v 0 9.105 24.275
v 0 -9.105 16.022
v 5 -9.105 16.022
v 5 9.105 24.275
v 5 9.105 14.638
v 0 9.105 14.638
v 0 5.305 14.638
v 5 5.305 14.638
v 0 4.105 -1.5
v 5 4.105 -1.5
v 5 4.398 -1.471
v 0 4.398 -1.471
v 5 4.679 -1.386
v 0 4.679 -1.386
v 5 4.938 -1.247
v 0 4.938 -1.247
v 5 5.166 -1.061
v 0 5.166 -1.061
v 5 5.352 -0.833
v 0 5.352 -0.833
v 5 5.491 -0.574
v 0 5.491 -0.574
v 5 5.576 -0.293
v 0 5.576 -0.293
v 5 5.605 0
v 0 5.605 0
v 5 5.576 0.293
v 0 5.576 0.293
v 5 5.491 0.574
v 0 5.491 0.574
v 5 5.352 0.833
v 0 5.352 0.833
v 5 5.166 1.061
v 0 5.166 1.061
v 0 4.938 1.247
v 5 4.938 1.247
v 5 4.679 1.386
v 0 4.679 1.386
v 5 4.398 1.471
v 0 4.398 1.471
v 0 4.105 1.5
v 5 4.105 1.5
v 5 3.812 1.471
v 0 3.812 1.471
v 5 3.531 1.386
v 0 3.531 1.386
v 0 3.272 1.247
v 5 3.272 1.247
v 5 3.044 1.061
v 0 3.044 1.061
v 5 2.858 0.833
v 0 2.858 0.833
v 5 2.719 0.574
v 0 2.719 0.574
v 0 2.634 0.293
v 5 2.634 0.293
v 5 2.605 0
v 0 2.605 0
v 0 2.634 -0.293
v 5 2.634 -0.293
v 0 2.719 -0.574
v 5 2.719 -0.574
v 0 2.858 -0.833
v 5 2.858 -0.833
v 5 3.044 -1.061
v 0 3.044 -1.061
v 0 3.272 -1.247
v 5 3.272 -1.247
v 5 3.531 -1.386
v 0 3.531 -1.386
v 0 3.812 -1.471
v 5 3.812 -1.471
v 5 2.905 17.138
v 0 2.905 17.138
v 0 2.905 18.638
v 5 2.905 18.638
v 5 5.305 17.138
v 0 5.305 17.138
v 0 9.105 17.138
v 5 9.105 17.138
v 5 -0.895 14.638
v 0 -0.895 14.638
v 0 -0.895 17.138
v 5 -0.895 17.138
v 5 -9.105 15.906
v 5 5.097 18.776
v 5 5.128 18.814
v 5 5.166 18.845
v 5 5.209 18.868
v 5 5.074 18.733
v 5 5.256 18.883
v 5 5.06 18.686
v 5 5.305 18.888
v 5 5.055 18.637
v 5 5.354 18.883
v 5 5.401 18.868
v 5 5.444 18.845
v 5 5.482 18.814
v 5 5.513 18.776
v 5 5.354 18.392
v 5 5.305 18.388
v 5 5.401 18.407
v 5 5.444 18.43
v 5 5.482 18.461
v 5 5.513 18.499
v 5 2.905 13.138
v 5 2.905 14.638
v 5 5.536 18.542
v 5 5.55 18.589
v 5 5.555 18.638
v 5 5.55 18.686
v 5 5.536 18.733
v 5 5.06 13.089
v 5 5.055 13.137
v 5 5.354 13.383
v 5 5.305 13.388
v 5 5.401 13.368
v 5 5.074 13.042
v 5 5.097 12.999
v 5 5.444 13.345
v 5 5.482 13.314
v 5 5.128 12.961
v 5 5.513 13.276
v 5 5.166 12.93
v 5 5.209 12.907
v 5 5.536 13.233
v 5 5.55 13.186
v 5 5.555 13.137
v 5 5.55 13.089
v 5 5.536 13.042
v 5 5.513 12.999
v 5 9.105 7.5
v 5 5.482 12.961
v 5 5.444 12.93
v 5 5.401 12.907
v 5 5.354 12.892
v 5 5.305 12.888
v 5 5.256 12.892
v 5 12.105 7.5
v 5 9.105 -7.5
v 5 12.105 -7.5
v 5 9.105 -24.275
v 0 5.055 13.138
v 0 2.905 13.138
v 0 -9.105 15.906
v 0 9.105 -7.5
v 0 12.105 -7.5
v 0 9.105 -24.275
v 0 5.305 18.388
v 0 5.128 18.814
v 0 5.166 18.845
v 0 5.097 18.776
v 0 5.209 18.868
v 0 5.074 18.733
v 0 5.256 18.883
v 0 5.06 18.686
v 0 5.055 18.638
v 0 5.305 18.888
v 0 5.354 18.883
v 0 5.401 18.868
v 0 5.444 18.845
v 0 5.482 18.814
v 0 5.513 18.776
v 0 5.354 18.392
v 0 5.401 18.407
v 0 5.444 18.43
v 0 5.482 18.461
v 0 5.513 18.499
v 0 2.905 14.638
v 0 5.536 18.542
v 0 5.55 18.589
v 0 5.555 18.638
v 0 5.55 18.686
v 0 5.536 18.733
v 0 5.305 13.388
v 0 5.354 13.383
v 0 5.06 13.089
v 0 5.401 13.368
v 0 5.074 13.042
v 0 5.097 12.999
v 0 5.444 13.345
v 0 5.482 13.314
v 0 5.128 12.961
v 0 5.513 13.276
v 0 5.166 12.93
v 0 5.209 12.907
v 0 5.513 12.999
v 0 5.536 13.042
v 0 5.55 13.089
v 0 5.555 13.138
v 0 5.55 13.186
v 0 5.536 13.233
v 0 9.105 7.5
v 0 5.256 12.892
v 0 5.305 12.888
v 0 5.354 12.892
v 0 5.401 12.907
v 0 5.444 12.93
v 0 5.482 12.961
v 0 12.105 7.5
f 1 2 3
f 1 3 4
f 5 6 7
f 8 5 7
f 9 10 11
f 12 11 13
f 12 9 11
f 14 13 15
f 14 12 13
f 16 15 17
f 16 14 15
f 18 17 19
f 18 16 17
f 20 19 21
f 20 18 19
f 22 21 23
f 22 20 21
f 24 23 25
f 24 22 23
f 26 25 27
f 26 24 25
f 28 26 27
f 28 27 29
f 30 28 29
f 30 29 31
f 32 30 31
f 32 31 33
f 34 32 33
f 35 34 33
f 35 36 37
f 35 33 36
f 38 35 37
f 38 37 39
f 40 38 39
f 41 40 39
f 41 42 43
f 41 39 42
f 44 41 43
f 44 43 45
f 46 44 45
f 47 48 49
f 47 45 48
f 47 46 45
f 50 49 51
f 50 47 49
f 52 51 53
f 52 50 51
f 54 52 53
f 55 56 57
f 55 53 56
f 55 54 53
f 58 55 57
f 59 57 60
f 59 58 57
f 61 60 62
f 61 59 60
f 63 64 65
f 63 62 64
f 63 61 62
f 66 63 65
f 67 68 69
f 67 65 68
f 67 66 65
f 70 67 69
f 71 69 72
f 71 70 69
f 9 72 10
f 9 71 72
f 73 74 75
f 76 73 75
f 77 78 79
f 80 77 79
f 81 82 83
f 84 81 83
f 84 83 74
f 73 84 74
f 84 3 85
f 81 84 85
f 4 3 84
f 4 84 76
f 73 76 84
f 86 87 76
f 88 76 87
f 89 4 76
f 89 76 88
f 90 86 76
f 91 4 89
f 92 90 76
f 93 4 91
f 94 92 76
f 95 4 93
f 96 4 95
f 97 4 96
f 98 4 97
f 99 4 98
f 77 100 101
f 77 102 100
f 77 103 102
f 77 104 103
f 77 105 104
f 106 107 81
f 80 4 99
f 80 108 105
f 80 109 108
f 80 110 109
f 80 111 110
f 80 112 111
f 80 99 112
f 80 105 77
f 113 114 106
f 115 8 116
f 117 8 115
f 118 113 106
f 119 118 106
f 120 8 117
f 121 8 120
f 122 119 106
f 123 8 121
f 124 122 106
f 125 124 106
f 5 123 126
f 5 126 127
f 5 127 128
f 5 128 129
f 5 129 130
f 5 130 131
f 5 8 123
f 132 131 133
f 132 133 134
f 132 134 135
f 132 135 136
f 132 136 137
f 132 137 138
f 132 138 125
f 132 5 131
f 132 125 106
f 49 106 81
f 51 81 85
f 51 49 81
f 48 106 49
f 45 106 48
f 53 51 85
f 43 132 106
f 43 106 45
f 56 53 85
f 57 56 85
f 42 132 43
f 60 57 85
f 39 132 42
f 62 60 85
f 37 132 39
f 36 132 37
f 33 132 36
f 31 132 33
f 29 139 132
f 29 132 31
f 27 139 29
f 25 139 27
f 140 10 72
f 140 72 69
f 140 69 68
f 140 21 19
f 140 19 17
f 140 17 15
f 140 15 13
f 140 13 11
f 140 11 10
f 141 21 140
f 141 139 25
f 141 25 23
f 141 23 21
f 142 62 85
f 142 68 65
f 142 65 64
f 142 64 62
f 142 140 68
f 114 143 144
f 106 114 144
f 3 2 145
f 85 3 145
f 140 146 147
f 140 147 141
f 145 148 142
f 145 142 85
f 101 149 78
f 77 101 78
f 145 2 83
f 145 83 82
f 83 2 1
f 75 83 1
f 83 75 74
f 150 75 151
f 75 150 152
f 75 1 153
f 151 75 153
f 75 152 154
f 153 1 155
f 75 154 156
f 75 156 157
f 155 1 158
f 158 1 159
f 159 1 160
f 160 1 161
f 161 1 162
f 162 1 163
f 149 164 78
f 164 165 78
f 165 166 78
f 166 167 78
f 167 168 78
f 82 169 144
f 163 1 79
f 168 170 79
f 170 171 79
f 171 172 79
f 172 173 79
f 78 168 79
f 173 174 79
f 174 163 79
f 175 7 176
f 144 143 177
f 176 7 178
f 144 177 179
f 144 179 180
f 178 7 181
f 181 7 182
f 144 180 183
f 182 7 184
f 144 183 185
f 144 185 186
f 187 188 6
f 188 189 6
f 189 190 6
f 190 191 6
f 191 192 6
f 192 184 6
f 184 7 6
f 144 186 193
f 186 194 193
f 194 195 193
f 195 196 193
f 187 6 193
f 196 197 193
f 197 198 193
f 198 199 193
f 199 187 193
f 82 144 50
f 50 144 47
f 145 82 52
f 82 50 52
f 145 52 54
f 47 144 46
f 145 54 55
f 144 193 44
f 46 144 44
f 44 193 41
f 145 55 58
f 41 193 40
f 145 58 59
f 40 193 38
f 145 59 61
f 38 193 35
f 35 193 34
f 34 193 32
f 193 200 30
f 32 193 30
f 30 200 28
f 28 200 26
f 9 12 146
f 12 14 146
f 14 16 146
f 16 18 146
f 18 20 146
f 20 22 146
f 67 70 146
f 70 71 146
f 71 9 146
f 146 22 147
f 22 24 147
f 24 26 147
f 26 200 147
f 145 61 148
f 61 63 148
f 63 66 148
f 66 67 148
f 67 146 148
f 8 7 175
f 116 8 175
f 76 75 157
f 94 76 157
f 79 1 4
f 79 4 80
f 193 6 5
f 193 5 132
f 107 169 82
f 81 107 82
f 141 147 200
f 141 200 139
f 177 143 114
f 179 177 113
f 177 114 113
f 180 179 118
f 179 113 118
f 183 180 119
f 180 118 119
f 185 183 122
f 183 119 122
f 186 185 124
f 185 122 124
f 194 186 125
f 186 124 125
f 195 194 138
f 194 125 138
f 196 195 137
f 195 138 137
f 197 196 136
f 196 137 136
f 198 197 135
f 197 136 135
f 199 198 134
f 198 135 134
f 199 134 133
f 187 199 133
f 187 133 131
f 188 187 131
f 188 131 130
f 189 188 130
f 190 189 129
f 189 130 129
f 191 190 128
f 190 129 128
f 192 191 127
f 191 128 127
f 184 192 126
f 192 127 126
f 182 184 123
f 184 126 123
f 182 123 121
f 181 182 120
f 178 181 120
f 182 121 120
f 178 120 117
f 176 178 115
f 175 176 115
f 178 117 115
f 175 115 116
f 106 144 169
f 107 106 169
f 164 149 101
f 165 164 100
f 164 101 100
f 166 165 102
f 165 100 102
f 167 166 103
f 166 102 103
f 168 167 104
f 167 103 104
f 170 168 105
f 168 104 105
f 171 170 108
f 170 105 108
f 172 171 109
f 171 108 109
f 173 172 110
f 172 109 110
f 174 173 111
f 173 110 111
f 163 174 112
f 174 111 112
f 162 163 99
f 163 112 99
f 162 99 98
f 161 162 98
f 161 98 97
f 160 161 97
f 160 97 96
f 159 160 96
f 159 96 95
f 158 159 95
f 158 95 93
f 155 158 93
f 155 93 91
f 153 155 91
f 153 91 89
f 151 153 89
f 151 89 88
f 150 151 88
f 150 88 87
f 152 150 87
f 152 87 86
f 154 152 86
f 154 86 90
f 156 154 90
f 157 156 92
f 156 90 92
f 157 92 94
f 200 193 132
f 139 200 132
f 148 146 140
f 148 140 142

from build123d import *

# Parameters (mm, degrees)
SCHIZZO1_W                   = 48.55
SCHIZZO1_H                   = 18.21
ESTRUSIONE_ESTRUSIONE1_DEPTH = 5
TAGLIO_ESTRUSIONE1_DEPTH     = 6
SCHIZZO3_R                   = 1.5
TAGLIO_ESTRUSIONE2_DEPTH     = 6
SCHIZZO4_W                   = 5
SCHIZZO4_H                   = 15
ESTRUSIONE_ESTRUSIONE2_DEPTH = 3
TAGLIO_ESTRUSIONE3_DEPTH     = 6
SCHIZZO7_R                   = 0.25
TAGLIO_ESTRUSIONE4_DEPTH     = 6


with BuildPart() as part:
    # Schizzo1 → Estrusione-Estrusione1 (new body)
    with BuildSketch(Plane(origin=(0, 0, 0), x_dir=(0, 0, -1), z_dir=(1, 0, 0))):
        Rectangle(SCHIZZO1_W, SCHIZZO1_H)
    extrude(amount=ESTRUSIONE_ESTRUSIONE1_DEPTH)

    # Schizzo2 → Taglio-Estrusione1 (cut, through all)
    with BuildSketch(Plane(origin=(0, 0, 0), x_dir=(0, 0, -1), z_dir=(1, 0, 0))):
        Polygon((24.275, 9.105), (-15.905998409, -9.105), (24.275, -9.105), align=None)
        Polygon((-24.275, 9.105), (-24.275, -9.105), (-16.019269678, -9.111556119), align=None)
    extrude(amount=TAGLIO_ESTRUSIONE1_DEPTH, mode=Mode.SUBTRACT)

    # Schizzo3 → Taglio-Estrusione2 (cut, through all)
    with BuildSketch(Plane(origin=(0, 0, 0), x_dir=(0, 0, -1), z_dir=(1, 0, 0))):
        with Locations((0, 4.105)):
            Circle(SCHIZZO3_R)
    extrude(amount=TAGLIO_ESTRUSIONE2_DEPTH, mode=Mode.SUBTRACT)

    # Schizzo4 → Estrusione-Estrusione2 (add)
    with BuildSketch(Plane(origin=(0, 9.105, 0), x_dir=(1, 0, 0), z_dir=(0, 1, 0))):
        with Locations((2.5, 0)):
            Rectangle(SCHIZZO4_W, SCHIZZO4_H)
    extrude(amount=ESTRUSIONE_ESTRUSIONE2_DEPTH)

    # Schizzo6 → Taglio-Estrusione3 (cut, through all)
    with BuildSketch(Plane(origin=(0, 0, 0), x_dir=(0, 0, -1), z_dir=(1, 0, 0))):
        Polygon((-17.1375, -0.895), (-17.1375, 2.905), (-18.6375, 2.905), (-18.6375, 5.305), (-17.1375, 5.305), (-17.1375, 9.105), (-14.6375, 9.105), (-14.6375, 5.305), (-13.1375, 5.305), (-13.1375, 2.905), (-14.6375, 2.905), (-14.6375, -0.895), align=None)
    extrude(amount=TAGLIO_ESTRUSIONE3_DEPTH, mode=Mode.SUBTRACT)

    # Schizzo7 → Taglio-Estrusione4 (cut, through all)
    with BuildSketch(Plane(origin=(5, 0, 0), x_dir=(0, 0, -1), z_dir=(1, 0, 0))):
        with Locations((-18.6375, 5.305)):
            Circle(SCHIZZO7_R)
        with Locations((-13.1375, 5.305)):
            Circle(SCHIZZO7_R)
    extrude(amount=-TAGLIO_ESTRUSIONE4_DEPTH, mode=Mode.SUBTRACT)


solid = part.part
